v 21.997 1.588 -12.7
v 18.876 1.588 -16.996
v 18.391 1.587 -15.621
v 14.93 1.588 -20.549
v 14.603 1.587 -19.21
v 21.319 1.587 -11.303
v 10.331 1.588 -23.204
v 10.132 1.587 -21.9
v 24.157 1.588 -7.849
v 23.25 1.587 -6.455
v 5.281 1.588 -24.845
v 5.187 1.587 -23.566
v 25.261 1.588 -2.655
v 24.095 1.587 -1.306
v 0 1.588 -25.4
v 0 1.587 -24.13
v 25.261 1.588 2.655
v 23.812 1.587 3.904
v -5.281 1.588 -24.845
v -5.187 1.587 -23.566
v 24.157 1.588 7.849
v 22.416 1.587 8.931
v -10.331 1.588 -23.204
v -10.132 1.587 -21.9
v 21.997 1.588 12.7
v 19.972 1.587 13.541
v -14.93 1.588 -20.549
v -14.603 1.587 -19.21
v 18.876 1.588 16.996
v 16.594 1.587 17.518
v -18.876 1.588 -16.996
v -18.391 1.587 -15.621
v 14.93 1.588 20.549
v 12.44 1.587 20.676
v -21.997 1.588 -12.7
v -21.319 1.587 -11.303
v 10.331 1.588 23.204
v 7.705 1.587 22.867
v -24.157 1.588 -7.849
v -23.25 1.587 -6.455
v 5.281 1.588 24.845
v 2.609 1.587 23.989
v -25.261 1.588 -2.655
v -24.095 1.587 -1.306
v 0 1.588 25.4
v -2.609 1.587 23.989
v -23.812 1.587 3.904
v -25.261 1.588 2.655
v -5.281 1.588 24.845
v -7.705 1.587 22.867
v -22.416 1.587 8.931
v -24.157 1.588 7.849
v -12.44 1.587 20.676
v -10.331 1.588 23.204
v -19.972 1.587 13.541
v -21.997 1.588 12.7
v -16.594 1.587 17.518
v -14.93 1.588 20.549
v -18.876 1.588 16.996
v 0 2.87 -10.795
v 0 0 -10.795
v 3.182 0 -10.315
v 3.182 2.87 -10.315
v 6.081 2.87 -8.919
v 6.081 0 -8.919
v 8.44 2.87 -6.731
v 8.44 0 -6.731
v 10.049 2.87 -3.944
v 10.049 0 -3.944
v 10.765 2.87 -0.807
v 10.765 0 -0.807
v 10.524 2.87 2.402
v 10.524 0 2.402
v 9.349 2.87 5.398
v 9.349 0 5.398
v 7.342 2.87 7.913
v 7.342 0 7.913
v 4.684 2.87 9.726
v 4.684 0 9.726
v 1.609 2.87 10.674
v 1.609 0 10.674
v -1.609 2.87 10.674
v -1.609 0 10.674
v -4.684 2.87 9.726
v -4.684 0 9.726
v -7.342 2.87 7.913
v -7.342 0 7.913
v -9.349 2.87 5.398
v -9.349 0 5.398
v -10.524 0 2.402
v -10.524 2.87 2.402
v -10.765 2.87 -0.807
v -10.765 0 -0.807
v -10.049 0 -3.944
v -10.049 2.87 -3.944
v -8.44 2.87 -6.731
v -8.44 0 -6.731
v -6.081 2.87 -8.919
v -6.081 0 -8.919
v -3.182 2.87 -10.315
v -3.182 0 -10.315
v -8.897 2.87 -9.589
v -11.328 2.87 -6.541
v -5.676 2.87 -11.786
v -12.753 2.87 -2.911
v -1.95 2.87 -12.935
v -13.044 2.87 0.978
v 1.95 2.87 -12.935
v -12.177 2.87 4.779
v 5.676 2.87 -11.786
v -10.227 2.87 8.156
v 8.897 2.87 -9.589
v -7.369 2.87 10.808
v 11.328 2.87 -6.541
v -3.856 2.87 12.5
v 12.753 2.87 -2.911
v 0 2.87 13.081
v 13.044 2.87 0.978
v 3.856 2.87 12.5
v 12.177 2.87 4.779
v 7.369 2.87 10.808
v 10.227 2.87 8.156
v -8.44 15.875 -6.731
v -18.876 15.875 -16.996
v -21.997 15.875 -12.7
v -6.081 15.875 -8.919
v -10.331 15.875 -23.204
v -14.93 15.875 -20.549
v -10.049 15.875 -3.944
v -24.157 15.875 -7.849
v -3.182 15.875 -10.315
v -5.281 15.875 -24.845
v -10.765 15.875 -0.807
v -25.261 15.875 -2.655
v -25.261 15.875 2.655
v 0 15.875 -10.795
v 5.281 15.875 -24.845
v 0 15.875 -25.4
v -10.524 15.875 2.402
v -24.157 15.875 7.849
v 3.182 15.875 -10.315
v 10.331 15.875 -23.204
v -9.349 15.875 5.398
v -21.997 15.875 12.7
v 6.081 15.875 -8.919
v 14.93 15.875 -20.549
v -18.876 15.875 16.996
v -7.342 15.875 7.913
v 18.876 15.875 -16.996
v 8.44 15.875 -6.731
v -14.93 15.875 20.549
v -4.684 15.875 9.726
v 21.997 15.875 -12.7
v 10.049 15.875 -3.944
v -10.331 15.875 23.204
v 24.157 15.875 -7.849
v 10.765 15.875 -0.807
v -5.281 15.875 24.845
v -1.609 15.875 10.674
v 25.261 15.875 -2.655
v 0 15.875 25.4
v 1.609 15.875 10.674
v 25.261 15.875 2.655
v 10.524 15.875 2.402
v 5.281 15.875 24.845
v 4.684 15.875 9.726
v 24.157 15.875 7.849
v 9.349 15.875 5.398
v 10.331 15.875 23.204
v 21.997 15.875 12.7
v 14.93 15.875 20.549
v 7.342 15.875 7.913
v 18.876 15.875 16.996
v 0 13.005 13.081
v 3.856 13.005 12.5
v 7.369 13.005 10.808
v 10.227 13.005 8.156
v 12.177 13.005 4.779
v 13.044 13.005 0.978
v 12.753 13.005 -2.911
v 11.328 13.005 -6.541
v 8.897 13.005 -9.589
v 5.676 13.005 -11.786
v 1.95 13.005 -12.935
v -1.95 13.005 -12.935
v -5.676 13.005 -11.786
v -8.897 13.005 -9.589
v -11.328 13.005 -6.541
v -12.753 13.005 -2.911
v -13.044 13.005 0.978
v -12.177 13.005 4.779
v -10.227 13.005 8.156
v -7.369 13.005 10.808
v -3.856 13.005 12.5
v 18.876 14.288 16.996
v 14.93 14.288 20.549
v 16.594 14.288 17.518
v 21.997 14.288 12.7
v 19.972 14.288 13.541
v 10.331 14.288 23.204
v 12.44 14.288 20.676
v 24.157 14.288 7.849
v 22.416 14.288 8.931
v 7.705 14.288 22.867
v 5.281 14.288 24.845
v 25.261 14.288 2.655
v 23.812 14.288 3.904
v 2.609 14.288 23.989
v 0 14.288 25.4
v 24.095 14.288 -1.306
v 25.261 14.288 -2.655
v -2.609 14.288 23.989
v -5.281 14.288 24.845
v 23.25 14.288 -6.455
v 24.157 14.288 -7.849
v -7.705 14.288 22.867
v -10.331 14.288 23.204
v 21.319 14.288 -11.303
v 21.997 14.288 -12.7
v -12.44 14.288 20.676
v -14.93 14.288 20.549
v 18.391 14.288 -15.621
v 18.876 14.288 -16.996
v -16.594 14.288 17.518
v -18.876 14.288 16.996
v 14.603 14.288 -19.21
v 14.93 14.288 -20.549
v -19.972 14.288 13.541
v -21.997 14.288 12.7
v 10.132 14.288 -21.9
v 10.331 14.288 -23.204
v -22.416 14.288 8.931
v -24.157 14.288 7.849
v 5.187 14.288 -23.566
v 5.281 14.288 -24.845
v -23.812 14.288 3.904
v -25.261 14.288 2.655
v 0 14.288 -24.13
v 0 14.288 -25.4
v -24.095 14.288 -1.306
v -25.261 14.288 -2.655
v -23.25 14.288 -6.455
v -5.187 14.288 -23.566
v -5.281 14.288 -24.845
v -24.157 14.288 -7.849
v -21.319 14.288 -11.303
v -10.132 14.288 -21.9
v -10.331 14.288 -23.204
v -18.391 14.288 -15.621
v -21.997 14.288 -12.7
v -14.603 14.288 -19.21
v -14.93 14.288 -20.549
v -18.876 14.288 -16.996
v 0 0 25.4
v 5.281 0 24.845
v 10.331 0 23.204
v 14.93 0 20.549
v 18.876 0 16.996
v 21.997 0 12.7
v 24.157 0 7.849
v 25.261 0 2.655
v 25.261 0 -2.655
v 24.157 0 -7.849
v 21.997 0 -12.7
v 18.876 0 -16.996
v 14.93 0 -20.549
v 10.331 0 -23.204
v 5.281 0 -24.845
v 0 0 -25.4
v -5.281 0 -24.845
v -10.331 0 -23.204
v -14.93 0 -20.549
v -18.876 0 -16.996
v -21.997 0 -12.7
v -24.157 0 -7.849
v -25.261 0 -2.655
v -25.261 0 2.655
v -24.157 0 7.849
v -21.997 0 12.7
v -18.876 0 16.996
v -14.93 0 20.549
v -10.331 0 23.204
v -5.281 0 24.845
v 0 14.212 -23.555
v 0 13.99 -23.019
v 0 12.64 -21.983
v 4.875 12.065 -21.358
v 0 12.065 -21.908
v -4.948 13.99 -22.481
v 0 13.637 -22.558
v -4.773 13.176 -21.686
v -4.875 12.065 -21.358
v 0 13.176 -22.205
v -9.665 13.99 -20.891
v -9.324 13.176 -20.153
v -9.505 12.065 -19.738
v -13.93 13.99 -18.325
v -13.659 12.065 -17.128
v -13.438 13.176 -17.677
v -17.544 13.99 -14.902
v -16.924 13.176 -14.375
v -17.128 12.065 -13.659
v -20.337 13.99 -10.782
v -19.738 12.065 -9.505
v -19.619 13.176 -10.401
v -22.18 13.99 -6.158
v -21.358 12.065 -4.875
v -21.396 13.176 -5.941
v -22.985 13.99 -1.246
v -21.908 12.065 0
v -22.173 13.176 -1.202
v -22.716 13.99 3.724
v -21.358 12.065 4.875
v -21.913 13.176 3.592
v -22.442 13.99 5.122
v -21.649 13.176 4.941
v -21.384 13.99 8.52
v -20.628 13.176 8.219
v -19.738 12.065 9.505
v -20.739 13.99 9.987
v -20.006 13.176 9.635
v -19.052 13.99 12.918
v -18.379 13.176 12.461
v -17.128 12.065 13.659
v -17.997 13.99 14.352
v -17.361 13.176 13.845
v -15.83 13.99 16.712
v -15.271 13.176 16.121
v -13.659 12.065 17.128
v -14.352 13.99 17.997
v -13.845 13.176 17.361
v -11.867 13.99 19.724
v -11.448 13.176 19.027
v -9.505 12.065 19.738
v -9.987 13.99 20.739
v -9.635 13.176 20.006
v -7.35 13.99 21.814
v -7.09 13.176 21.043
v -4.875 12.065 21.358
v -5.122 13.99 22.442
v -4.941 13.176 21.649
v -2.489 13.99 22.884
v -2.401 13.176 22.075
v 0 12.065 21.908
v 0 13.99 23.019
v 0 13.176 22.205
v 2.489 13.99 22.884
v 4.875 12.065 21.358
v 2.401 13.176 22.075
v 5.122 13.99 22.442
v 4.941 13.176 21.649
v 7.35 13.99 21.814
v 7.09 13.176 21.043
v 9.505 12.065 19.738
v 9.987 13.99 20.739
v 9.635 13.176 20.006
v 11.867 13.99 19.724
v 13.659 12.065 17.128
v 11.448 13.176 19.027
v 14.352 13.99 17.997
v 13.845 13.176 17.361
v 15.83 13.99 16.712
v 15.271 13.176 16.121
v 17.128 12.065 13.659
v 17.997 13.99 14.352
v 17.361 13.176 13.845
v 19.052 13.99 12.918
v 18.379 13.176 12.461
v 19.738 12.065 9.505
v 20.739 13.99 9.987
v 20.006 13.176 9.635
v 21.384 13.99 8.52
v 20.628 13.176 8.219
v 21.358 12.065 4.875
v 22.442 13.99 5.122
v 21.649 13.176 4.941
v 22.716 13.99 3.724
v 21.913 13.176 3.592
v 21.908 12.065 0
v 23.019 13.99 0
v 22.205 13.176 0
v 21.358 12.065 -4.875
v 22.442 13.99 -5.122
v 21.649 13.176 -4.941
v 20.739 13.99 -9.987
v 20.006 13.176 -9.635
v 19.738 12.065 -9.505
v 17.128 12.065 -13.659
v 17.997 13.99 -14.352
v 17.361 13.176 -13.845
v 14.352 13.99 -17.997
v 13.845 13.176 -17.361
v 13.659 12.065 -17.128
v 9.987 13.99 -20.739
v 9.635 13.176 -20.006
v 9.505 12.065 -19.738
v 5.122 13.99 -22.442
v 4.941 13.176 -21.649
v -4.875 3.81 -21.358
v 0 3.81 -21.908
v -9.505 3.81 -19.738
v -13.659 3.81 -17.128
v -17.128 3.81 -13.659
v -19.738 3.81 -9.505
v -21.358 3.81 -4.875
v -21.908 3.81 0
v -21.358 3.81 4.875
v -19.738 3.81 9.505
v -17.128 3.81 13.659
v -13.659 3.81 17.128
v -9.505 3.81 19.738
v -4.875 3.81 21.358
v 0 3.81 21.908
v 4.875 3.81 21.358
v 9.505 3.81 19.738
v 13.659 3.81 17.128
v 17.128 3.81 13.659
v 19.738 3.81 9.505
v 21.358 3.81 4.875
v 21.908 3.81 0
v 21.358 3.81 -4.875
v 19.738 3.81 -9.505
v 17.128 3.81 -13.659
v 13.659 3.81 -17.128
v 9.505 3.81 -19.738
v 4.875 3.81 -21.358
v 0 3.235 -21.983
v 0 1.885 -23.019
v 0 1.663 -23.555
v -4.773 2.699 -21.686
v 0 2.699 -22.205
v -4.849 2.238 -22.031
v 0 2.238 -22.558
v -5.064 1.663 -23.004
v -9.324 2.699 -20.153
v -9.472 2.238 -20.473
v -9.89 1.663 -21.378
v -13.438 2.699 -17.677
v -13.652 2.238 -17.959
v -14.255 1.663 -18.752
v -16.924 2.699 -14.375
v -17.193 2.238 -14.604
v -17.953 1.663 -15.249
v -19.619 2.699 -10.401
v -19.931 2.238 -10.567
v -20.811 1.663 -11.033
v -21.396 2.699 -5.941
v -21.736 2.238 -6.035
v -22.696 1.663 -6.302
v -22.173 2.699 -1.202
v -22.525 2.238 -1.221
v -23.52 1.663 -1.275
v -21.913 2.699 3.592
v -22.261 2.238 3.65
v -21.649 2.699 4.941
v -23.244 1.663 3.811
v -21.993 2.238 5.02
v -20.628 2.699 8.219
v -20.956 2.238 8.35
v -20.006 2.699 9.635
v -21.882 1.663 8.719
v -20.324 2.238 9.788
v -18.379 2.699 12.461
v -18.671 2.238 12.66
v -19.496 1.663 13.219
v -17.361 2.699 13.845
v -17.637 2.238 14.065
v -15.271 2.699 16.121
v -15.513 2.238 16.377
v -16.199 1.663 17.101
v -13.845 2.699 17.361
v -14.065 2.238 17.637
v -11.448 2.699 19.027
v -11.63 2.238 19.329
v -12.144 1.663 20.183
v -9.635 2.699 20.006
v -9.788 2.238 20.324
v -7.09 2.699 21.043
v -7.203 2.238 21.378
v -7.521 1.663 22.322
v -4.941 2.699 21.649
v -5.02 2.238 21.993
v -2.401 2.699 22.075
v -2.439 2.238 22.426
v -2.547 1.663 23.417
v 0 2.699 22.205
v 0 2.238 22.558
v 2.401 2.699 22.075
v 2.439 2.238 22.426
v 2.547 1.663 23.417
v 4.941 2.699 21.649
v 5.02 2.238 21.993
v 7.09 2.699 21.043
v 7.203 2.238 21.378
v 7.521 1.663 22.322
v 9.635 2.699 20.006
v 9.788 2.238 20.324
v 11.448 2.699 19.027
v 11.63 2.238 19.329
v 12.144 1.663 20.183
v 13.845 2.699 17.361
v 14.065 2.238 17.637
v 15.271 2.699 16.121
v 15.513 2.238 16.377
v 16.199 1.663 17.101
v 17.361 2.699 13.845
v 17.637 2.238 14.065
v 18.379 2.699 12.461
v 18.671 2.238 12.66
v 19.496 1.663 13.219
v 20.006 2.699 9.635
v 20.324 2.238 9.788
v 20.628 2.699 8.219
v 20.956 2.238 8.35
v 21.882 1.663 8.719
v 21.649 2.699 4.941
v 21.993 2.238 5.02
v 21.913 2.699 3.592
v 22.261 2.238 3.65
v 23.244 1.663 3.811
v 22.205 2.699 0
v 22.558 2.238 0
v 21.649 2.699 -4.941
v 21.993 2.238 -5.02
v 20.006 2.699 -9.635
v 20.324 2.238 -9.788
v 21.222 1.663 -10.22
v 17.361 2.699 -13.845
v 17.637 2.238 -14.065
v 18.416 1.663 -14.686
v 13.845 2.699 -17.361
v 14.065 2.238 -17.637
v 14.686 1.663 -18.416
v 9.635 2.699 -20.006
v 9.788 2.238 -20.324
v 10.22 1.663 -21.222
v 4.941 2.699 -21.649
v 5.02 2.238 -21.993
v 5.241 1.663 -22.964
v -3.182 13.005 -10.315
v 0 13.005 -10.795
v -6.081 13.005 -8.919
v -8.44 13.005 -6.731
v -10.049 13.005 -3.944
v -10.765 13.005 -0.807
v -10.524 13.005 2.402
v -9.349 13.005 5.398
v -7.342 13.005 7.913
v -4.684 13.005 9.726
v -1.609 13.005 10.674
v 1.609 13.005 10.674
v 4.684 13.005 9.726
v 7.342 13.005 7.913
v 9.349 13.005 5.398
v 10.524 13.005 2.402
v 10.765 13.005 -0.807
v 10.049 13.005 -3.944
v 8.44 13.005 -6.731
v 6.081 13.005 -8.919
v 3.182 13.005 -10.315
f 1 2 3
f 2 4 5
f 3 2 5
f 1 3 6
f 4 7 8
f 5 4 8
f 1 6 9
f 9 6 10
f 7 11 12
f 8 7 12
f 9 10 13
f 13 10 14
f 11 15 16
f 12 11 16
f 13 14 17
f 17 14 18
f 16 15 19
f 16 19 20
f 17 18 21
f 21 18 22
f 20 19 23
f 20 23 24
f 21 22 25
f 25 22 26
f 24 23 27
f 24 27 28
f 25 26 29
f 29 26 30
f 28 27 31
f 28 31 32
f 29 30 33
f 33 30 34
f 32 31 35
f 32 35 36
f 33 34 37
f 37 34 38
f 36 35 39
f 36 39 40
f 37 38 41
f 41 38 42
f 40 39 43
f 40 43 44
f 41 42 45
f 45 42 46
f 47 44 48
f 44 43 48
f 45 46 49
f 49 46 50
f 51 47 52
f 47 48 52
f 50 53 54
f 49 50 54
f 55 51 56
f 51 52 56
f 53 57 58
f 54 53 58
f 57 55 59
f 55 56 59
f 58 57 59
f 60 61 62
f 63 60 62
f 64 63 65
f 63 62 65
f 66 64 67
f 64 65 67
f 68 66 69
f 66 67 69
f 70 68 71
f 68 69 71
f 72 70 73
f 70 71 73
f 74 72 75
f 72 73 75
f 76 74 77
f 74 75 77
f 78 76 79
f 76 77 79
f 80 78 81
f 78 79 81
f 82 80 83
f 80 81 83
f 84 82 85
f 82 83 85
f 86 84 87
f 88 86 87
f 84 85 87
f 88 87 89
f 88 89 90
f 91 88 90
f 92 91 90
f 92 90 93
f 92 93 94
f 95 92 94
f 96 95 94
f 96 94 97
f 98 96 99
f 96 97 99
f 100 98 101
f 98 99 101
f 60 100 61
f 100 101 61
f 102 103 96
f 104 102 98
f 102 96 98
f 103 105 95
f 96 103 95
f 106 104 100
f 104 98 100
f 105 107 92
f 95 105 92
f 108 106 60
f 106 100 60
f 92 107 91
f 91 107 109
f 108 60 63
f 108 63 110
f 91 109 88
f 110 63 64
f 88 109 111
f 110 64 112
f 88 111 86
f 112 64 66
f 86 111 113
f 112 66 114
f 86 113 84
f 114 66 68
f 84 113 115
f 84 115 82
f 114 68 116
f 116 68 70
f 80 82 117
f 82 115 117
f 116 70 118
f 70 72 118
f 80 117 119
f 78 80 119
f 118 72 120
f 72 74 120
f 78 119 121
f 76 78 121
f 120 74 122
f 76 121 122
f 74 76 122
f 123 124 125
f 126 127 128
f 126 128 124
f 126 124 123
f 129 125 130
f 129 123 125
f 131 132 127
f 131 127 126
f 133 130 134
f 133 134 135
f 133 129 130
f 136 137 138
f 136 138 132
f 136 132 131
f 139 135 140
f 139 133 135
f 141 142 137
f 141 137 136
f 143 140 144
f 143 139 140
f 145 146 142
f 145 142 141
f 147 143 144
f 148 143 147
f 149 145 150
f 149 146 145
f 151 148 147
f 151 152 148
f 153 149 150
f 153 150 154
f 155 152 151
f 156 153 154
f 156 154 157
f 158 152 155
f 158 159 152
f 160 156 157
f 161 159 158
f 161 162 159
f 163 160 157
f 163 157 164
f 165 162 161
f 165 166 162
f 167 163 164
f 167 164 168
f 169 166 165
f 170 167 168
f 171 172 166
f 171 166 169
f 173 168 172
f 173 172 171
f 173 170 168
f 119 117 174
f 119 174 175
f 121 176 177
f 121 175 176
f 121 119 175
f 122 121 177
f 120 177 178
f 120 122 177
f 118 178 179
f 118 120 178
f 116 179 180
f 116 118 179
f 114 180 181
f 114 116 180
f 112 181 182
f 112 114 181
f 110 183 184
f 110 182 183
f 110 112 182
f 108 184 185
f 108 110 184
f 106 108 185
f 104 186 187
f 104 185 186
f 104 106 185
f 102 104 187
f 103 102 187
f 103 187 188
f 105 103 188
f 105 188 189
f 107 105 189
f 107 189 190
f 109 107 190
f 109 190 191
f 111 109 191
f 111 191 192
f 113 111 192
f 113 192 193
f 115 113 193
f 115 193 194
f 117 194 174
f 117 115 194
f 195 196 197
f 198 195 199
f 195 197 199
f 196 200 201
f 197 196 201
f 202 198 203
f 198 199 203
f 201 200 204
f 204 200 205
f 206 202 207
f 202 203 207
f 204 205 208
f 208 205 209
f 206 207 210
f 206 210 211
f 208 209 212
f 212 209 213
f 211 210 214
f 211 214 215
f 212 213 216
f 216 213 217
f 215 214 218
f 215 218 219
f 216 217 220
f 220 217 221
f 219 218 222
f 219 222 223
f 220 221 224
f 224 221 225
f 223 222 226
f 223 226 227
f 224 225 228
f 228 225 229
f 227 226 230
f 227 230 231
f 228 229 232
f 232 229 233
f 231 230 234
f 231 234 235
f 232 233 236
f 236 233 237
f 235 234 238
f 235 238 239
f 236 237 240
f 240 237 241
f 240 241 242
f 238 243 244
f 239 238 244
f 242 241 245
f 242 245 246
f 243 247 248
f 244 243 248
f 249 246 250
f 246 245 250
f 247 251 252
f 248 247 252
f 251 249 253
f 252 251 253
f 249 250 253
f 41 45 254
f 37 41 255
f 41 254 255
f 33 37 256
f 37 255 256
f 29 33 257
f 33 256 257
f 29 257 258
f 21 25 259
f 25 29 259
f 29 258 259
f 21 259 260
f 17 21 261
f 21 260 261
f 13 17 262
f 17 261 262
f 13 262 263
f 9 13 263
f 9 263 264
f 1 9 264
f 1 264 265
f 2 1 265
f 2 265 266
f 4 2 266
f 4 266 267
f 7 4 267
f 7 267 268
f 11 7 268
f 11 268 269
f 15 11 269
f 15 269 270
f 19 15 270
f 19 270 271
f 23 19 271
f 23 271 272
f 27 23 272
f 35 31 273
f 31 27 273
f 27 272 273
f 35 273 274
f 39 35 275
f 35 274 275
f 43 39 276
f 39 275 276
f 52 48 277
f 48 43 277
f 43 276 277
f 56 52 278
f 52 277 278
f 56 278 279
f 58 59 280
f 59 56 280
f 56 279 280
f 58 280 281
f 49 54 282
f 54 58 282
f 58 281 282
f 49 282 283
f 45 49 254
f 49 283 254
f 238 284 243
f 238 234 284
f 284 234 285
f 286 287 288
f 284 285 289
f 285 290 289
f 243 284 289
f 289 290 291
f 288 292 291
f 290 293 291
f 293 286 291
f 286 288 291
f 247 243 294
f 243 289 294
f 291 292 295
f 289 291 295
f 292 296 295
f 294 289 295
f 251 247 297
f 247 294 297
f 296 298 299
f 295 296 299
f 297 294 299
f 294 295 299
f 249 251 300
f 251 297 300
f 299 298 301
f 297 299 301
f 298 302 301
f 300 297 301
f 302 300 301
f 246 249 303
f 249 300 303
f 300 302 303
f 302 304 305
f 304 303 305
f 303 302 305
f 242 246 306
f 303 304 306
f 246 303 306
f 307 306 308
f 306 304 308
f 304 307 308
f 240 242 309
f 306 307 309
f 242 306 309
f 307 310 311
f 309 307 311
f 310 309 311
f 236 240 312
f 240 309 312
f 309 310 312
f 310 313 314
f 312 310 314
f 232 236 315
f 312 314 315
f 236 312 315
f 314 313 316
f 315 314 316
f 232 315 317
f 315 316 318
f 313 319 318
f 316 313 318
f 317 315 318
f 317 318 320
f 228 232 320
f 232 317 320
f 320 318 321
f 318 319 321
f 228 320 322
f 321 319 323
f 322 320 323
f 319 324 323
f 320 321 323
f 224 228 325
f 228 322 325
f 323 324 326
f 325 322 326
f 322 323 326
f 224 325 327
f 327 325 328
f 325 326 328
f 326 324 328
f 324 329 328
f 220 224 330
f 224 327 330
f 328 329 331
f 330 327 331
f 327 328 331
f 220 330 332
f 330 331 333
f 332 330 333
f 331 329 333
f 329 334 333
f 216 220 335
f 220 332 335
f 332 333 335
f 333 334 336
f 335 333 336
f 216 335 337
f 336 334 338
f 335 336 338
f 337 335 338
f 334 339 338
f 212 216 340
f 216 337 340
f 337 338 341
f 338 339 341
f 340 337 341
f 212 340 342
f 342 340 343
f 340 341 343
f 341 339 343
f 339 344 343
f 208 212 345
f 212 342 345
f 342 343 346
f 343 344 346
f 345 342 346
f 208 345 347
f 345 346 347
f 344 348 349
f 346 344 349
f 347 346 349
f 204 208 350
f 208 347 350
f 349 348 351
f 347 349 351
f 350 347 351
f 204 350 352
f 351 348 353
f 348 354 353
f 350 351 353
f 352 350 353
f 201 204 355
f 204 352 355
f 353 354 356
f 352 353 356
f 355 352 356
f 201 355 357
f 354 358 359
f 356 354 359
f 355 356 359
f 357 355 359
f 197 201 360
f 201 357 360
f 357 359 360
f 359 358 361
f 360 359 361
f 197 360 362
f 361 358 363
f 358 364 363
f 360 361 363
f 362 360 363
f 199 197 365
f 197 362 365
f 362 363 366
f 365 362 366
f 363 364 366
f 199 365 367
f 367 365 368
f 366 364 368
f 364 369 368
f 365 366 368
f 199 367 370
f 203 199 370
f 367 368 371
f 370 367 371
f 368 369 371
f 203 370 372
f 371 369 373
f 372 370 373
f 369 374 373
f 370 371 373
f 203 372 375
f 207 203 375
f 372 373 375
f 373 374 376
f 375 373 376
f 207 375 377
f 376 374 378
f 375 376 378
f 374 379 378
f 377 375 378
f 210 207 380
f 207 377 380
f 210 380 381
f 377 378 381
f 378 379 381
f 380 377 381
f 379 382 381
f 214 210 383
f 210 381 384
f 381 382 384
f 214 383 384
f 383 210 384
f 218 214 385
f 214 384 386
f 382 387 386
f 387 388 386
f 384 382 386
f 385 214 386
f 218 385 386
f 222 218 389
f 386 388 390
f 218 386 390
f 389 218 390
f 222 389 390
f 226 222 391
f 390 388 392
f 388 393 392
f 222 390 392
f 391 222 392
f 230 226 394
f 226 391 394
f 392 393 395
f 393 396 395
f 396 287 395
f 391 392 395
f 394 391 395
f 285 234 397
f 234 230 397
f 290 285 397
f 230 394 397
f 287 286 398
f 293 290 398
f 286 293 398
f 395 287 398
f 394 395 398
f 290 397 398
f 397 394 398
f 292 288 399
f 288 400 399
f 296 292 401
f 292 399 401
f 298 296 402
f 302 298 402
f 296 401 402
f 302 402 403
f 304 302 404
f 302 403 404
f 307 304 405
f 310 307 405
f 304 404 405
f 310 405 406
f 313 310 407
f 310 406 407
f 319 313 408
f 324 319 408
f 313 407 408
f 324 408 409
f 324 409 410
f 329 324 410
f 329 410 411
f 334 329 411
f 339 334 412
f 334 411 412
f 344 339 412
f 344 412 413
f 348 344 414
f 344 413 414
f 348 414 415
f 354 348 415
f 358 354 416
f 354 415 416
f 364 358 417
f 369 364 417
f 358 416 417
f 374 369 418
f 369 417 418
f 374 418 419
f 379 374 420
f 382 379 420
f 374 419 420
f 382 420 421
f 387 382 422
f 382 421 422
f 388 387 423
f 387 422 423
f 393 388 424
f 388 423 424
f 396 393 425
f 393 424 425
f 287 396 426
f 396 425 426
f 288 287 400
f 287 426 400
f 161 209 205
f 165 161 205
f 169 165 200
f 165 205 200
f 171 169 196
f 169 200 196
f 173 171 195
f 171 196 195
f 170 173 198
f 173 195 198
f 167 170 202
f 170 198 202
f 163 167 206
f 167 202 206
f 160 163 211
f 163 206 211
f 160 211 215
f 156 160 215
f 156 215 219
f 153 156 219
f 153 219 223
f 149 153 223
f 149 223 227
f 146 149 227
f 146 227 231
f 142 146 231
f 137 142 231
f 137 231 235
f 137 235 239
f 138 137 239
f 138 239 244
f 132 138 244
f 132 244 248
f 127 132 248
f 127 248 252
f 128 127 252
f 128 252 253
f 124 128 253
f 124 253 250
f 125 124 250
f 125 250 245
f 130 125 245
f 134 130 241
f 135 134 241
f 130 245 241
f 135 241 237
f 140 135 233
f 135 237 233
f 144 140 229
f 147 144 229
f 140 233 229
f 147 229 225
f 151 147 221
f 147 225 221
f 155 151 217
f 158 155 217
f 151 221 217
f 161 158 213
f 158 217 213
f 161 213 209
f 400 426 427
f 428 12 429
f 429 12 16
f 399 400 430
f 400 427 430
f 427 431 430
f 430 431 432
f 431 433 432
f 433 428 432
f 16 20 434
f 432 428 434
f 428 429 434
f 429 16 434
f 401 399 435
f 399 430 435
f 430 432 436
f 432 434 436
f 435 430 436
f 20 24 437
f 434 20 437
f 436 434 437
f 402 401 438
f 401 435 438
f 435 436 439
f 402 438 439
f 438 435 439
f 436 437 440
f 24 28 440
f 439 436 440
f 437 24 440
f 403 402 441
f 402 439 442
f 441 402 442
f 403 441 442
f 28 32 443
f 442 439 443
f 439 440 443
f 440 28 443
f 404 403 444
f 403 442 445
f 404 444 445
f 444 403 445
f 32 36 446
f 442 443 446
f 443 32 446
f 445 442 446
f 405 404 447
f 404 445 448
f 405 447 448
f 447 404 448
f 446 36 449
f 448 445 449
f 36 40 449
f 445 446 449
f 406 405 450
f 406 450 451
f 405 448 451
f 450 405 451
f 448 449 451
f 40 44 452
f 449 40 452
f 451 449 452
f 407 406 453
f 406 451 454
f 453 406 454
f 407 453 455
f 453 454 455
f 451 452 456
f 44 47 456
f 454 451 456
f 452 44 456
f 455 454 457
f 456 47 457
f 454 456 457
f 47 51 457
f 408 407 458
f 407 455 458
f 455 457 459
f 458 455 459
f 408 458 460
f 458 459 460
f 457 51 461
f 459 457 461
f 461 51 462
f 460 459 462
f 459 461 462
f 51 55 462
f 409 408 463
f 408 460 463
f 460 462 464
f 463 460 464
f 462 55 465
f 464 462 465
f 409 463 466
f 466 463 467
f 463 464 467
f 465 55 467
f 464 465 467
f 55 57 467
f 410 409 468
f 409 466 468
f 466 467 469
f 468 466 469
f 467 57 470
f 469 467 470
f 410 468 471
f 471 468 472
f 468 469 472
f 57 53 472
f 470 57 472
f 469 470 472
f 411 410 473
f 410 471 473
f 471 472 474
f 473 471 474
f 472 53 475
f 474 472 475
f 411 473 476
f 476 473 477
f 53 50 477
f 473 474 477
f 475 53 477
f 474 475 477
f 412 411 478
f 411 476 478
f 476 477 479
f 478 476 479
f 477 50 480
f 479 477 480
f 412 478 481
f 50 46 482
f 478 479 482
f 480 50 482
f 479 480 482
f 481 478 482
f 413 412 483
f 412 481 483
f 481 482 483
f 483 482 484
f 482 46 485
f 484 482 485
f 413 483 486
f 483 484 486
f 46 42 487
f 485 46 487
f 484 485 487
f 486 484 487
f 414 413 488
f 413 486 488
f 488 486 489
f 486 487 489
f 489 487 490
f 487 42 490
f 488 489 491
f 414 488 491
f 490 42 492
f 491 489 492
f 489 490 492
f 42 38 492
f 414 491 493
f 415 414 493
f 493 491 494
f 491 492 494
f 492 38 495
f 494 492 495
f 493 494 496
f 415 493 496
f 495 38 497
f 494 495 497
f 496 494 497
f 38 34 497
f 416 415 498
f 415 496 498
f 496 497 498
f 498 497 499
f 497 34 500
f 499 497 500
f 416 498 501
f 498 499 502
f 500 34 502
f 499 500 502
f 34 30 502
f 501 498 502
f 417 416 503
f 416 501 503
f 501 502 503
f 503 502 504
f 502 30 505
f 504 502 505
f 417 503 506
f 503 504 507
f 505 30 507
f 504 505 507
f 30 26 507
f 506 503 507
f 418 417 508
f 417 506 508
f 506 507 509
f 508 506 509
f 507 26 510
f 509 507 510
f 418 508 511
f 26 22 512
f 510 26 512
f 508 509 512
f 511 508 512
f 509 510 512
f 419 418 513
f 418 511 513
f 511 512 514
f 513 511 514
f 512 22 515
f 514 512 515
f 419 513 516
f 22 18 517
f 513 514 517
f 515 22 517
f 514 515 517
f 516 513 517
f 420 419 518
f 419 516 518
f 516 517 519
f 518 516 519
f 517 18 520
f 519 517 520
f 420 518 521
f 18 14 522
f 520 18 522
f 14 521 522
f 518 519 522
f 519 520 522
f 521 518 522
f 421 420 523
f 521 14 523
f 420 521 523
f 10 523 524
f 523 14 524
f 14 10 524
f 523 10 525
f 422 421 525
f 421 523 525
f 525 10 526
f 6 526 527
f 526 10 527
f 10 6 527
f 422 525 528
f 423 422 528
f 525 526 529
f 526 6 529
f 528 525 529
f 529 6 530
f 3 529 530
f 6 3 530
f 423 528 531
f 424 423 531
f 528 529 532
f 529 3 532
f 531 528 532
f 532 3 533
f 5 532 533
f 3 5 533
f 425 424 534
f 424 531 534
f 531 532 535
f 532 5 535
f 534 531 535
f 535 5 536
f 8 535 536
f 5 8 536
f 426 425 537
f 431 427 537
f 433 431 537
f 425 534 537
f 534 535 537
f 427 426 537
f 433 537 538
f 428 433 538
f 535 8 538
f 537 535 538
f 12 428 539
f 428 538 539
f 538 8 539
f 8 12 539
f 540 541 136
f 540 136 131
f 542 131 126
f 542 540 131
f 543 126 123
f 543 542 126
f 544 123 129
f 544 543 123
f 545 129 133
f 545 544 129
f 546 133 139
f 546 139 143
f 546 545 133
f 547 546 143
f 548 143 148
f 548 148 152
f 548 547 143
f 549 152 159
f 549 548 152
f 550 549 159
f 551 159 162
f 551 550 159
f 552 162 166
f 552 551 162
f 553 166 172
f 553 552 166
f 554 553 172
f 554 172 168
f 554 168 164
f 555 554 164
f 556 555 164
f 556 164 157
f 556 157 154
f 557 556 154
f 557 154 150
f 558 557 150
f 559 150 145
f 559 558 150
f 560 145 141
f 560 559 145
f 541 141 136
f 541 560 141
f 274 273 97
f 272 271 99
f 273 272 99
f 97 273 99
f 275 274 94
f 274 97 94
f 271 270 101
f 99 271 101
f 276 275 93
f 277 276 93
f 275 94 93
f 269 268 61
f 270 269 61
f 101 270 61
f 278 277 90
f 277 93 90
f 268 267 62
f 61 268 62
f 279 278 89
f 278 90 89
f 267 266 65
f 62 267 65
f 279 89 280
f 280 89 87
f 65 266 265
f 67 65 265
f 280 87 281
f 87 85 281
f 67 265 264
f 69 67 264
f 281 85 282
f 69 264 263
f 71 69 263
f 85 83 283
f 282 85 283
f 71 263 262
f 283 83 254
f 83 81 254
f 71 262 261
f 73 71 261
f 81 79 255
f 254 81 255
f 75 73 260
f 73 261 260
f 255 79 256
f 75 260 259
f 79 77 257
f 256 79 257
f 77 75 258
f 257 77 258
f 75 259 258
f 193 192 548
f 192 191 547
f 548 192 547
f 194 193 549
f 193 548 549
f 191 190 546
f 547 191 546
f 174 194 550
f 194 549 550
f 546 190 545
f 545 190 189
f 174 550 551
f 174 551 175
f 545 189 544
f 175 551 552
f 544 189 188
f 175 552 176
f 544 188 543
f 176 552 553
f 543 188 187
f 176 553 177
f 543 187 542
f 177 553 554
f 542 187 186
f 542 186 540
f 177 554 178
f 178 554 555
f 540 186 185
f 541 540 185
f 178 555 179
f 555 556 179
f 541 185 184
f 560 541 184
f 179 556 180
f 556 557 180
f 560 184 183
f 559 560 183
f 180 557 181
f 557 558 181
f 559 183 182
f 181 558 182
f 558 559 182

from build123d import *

# Parameters (mm, degrees)
SKETCH1_R           = 25.4
SKETCH1_R_2         = 13.081
BOSS_EXTRUDE1_DEPTH = 15.875
SKETCH7_R           = 15.875
SKETCH7_R_2         = 10.795
BOSS_EXTRUDE2_DEPTH = 2.8702
BOSS_EXTRUDE5_START = -2.8702
SKETCH9_R           = 15.875
SKETCH9_R_2         = 10.795
BOSS_EXTRUDE5_DEPTH = 2.8702


with BuildPart() as part:
    # Sketch1 → Boss-Extrude1 (new body)
    with BuildSketch(Plane(origin=(0, 0, 0), x_dir=(1, 0, 0), z_dir=(0, 1, 0))):
        with Locations(Location((0, 0, 0), (0, 0, 270))):
            Circle(SKETCH1_R)
        with Locations(Location((0, 0, 0), (0, 0, 270))):
            Circle(SKETCH1_R_2, mode=Mode.SUBTRACT)
    extrude(amount=BOSS_EXTRUDE1_DEPTH)

    # Sketch2 → Cut-Revolve1 (revolve, cut)
    with BuildSketch(Plane.XY, mode=Mode.PRIVATE) as cut_revolve1_sk:
        with BuildLine():
            Line((25.4, 14.2875), (24.13, 14.2875))
            ThreePointArc((24.13, 14.2875), (22.558455179, 13.636544821), (21.9075, 12.065))
            Line((21.9075, 12.065), (21.9075, 3.81))
            ThreePointArc((21.9075, 3.81), (22.558455179, 2.238455179), (24.13, 1.5875))
            Line((24.13, 1.5875), (25.4, 1.5875))
            Line((25.4, 1.5875), (25.4, 14.2875))
        make_face()
    revolve(cut_revolve1_sk.sketch.rotate(Axis((0, 0, 0), (0, 1, 0)), 90), axis=Axis((0, 0, 0), (0, 1, 0)), mode=Mode.SUBTRACT)

    # Sketch7 → Boss-Extrude2 (add)
    with BuildSketch(Plane.XZ):
        Circle(SKETCH7_R)
        with Locations(Location((0, 0, 0), (0, 0, 270))):
            Circle(SKETCH7_R_2, mode=Mode.SUBTRACT)
    extrude(amount=-BOSS_EXTRUDE2_DEPTH)

    # Sketch9 → Boss-Extrude5 (add)
    with BuildSketch(Plane(origin=(0, 15.875, 0), x_dir=(1, 0, 0), z_dir=(0, 1, 0)).offset(BOSS_EXTRUDE5_START)):
        Circle(SKETCH9_R)
        with Locations(Location((0, 0, 0), (0, 0, 90))):
            Circle(SKETCH9_R_2, mode=Mode.SUBTRACT)
    extrude(amount=BOSS_EXTRUDE5_DEPTH)


solid = part.part
